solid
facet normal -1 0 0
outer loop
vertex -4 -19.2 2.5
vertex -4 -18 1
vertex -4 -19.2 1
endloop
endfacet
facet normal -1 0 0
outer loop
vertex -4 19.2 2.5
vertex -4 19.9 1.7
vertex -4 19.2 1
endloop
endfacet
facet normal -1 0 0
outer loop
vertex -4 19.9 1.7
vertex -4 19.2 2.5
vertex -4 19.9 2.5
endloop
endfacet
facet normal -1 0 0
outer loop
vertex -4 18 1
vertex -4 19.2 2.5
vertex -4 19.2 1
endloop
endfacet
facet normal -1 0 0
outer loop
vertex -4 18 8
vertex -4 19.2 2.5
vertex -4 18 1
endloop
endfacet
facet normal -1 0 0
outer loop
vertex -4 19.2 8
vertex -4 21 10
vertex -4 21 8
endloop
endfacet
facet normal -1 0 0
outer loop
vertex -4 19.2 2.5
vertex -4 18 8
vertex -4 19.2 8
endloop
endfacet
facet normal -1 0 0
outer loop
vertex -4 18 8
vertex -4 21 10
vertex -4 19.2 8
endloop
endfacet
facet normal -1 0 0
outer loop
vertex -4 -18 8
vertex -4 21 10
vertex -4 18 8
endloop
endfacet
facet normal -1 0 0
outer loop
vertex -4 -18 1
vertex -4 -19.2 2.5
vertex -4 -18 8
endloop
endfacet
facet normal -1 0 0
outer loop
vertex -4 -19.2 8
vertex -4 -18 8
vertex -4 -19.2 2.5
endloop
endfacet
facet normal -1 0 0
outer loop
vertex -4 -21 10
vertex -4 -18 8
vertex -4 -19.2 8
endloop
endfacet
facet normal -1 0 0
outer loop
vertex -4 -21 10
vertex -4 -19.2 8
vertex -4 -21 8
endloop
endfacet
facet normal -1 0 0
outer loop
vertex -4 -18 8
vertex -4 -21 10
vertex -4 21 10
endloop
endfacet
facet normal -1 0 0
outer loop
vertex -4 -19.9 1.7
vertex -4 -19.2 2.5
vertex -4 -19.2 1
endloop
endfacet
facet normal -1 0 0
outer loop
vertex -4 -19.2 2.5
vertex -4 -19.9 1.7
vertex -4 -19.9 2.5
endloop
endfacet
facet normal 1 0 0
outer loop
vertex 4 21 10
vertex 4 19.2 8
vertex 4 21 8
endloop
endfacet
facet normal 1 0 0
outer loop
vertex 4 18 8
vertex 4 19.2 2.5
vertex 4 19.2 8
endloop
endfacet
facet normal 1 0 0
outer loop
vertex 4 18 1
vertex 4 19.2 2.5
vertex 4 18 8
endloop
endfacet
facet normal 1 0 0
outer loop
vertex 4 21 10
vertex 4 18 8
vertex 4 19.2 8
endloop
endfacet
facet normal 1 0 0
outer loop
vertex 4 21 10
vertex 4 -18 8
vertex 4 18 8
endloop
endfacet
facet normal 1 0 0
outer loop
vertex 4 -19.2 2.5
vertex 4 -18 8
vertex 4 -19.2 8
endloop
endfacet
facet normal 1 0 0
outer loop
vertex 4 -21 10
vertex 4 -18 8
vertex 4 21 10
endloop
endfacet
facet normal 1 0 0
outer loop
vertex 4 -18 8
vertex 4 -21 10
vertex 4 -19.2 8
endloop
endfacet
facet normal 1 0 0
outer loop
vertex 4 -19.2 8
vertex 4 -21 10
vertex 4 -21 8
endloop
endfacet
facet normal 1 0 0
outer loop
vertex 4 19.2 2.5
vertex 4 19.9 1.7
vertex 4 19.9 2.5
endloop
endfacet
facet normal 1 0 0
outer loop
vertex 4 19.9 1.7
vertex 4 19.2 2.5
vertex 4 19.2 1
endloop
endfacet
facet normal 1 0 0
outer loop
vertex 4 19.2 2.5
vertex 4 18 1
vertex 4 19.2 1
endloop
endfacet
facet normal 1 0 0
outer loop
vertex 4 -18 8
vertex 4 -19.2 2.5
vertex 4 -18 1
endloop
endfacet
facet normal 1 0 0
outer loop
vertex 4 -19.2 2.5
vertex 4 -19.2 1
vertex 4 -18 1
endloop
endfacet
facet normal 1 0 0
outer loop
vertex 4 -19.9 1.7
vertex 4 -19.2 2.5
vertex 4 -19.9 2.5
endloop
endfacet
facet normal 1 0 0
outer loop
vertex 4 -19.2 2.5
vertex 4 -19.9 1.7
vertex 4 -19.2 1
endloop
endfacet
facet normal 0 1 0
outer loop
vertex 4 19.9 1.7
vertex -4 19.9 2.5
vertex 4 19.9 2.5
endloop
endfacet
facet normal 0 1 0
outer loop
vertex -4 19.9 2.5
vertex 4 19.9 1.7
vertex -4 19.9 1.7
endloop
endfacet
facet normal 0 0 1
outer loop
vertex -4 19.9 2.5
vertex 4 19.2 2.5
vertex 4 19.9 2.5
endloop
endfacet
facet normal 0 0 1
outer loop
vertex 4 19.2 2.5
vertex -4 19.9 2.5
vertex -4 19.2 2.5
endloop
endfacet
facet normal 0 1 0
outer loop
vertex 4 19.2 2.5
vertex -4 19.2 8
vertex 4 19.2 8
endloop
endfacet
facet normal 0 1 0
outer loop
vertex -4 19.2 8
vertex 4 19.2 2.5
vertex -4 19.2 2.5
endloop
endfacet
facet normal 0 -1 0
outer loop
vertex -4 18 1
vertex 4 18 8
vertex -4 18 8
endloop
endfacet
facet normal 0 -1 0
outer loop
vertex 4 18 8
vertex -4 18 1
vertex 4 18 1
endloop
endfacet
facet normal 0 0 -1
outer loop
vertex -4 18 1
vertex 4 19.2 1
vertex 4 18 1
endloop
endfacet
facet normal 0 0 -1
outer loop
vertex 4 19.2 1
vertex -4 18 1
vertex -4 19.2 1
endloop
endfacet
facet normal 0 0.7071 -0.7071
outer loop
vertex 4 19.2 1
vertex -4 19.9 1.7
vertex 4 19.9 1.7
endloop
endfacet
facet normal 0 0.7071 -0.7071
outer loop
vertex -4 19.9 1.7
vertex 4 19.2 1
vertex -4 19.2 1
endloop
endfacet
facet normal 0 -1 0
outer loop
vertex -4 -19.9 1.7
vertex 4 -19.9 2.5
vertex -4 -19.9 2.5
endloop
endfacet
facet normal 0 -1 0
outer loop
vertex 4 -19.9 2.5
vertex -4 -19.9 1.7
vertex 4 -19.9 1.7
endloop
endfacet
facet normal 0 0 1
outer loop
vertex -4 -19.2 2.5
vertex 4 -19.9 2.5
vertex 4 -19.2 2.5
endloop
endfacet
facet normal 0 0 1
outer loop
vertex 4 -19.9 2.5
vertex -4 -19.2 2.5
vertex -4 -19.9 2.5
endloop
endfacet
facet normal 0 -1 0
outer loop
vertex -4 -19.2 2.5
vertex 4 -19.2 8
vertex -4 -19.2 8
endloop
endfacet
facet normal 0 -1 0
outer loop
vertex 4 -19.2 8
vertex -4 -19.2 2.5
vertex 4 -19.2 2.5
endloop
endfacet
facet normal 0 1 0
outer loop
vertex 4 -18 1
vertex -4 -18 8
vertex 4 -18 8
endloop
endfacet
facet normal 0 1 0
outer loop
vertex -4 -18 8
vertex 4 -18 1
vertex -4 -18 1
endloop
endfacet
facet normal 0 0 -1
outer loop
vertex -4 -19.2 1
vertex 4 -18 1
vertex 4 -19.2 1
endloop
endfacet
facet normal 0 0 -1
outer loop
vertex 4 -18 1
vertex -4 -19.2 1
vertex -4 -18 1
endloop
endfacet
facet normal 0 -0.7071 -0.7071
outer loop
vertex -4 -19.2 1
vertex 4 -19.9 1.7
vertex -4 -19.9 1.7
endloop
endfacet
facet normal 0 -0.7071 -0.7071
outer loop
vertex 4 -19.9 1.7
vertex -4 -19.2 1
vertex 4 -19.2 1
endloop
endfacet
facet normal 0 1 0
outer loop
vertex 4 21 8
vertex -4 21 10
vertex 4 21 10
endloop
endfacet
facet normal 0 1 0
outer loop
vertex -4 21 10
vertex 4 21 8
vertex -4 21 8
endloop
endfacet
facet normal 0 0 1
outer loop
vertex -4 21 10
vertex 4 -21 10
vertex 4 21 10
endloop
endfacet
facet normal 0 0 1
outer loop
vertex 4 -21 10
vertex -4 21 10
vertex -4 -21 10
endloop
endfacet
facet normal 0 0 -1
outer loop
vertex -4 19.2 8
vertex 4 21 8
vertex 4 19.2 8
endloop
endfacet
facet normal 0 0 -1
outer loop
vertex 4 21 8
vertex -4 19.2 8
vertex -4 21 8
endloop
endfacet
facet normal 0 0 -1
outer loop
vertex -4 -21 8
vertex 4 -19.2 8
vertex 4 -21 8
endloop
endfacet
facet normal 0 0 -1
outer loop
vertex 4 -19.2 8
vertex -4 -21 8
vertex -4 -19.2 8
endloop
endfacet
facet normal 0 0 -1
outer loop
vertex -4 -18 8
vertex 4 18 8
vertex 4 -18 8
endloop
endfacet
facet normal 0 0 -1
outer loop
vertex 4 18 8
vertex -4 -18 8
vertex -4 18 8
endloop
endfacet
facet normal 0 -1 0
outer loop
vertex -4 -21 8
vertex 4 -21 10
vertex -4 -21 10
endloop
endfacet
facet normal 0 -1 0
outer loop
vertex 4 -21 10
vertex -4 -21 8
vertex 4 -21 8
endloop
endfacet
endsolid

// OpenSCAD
// The bar where it sits snapped into the station's posts, for the catalogue: the moving part
// of the "How it goes on" view, and the body for the collision check. Same span and h as
// station.scad.
use <../bridge.scad>

over = 25 + 2*(0.4 + 1.6);
span = brSpanFor(over);       // 36.5
h    = brBarZ(6.0);           // 8

rotate([0, 0, 90]) bridgeBar(span, h);
